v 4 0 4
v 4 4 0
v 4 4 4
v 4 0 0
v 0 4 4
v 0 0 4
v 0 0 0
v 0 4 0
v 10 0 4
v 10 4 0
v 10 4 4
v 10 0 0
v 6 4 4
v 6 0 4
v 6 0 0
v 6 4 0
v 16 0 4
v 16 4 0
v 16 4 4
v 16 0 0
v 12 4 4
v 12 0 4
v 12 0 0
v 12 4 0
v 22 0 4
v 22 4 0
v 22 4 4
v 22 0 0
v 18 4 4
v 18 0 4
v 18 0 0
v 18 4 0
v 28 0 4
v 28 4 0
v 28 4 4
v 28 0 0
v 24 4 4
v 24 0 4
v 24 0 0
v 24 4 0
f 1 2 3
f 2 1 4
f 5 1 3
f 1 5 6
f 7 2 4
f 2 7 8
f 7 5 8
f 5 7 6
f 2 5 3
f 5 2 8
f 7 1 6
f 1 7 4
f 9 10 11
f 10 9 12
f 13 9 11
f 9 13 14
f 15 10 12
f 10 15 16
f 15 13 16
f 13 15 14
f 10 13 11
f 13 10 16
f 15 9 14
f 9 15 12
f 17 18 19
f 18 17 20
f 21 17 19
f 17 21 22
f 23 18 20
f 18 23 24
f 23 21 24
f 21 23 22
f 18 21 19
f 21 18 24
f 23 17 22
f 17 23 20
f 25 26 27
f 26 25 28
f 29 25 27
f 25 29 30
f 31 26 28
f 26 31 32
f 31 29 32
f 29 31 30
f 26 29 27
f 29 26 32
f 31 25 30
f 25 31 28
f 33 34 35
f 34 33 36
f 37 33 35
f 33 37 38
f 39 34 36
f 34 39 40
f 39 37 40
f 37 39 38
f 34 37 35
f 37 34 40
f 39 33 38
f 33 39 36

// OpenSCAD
// Construct: for-loop over a range placing a row of cubes.
for (i = [0 : 4]) {
    translate([i * 6, 0, 0]) cube(4);
}
